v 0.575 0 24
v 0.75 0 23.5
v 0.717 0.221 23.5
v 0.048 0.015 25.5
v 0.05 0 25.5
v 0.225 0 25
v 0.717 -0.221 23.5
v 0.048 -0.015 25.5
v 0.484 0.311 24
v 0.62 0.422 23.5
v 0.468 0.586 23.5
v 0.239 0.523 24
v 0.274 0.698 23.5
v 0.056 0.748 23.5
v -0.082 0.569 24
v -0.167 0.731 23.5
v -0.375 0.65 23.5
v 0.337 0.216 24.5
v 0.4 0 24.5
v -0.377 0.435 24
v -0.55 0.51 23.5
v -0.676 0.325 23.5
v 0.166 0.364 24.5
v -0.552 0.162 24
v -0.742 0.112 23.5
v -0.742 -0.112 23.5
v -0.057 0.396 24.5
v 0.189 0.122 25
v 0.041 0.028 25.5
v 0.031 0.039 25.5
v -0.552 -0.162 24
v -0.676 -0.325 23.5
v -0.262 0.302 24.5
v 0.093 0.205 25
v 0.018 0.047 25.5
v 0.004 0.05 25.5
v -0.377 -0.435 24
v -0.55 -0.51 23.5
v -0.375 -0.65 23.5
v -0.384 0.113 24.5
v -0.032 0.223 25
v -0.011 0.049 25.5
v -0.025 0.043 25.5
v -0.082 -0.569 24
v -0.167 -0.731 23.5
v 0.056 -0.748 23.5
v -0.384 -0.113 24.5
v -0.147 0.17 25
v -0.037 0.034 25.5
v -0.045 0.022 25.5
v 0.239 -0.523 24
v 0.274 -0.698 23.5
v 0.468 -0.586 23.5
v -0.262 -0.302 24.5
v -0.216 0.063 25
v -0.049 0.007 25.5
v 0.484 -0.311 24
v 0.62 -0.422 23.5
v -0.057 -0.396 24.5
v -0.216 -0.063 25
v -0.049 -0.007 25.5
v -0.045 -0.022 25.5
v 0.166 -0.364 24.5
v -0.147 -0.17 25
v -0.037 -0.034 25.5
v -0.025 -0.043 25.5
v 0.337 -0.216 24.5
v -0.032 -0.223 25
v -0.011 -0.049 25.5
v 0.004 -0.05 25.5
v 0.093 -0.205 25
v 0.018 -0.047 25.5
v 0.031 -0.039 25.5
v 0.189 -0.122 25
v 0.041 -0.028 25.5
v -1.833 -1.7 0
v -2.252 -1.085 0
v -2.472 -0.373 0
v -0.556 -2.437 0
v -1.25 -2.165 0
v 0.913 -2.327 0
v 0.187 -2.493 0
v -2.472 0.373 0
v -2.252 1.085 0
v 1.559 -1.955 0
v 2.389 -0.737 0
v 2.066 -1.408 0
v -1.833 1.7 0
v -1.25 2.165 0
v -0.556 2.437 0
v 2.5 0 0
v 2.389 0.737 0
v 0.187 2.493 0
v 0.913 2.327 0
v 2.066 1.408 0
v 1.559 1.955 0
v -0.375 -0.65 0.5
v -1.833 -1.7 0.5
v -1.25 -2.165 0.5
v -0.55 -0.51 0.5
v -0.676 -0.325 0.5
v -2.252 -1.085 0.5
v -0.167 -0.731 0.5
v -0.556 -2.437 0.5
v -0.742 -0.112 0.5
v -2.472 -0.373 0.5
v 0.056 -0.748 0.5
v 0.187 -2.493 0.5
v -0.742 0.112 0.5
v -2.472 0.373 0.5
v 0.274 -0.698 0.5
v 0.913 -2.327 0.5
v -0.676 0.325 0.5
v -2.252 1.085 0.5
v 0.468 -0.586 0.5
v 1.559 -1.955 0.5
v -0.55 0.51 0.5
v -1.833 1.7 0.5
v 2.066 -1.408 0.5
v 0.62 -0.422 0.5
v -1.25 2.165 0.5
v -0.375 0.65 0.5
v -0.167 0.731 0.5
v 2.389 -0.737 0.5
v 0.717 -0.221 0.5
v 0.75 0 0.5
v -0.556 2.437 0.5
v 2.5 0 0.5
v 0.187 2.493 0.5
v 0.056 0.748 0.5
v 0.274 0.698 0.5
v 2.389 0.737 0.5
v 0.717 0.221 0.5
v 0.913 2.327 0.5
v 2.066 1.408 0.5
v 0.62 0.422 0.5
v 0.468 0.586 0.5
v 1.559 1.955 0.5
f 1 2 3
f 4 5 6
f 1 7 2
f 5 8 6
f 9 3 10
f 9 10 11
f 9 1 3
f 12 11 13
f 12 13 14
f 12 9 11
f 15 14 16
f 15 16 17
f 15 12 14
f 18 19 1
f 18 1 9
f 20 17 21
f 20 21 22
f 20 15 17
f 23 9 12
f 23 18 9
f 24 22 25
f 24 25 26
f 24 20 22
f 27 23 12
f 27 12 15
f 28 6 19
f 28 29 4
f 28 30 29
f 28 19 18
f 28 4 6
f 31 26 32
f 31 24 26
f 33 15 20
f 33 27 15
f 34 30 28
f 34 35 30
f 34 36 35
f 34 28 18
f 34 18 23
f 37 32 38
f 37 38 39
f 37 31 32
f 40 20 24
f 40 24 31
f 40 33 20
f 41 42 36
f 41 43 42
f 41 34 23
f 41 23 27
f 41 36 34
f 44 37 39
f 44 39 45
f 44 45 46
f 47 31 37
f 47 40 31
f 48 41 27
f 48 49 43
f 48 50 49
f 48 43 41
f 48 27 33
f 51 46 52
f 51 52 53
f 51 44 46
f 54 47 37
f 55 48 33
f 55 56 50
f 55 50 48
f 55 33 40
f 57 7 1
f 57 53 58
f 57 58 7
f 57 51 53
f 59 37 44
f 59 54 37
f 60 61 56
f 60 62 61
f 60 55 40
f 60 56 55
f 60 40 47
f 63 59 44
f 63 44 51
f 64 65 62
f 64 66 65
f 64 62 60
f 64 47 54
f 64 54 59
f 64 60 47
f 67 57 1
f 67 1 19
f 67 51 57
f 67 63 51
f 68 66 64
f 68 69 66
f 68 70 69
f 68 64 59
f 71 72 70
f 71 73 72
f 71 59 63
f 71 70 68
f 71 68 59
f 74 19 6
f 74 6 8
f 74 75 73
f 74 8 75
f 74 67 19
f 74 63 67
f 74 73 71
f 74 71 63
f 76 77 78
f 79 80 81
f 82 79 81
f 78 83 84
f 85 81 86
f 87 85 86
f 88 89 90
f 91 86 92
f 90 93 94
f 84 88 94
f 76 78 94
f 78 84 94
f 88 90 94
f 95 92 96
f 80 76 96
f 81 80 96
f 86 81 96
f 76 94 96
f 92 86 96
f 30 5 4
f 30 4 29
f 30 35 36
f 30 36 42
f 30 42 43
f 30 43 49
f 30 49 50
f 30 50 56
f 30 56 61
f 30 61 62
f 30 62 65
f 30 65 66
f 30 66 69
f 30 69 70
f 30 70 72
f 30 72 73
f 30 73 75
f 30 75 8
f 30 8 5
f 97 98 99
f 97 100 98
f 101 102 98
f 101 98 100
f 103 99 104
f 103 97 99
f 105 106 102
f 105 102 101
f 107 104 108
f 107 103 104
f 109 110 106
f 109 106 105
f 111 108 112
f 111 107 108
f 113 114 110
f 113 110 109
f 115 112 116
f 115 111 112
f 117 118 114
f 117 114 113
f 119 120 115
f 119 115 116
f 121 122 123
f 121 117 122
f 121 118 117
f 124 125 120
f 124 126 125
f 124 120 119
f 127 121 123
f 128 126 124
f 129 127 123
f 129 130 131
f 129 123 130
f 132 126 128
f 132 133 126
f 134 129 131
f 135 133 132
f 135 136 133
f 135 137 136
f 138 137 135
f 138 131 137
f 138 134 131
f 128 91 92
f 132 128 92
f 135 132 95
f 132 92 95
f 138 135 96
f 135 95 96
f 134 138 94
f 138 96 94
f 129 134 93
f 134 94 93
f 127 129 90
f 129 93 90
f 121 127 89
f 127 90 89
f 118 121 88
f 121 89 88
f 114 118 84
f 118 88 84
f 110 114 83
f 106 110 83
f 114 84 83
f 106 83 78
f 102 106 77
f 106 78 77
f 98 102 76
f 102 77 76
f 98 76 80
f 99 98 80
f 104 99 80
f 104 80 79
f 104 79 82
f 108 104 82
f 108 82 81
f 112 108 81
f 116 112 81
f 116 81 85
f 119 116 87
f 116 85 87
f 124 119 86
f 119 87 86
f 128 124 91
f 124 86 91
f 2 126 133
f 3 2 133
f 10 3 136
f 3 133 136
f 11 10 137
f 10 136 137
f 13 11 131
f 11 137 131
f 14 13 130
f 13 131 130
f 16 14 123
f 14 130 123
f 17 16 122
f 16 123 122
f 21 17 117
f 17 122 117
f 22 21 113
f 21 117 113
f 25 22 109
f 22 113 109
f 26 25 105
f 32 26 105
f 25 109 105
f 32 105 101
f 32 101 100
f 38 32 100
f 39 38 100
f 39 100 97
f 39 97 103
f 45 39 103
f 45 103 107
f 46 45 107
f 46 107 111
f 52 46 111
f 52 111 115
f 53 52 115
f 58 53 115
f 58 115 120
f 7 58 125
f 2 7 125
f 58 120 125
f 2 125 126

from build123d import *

# Parameters (mm, degrees)
SKETCH1_R      = 2.5
EXTRUDE1_DEPTH = 0.5
SKETCH2_R      = 0.75
EXTRUDE2_DEPTH = 25
CHAMFER1_SIZE  = 2
CHAMFER1_SIZE2 = 0.7


with BuildPart() as part:
    # Sketch1 → Extrude1 (new body)
    with BuildSketch(Plane.XY):
        Circle(SKETCH1_R)
    extrude(amount=EXTRUDE1_DEPTH)

    # Sketch2 → Extrude2 (add)
    with BuildSketch(Plane.XY.offset(0.5)):
        Circle(SKETCH2_R)
    extrude(amount=EXTRUDE2_DEPTH)

    # Chamfer1
    chamfer1_edges = [part.edges().sort_by_distance(p)[0] for p in [
        (-0.75, 0, 25.5),
    ]]
    chamfer1_side = [part.faces().sort_by_distance(p)[0] for p in [
        (-0.75, 0, 13),
    ]]
    chamfer(chamfer1_edges, length=CHAMFER1_SIZE, length2=CHAMFER1_SIZE2, reference=chamfer1_side[0])


solid = part.part
